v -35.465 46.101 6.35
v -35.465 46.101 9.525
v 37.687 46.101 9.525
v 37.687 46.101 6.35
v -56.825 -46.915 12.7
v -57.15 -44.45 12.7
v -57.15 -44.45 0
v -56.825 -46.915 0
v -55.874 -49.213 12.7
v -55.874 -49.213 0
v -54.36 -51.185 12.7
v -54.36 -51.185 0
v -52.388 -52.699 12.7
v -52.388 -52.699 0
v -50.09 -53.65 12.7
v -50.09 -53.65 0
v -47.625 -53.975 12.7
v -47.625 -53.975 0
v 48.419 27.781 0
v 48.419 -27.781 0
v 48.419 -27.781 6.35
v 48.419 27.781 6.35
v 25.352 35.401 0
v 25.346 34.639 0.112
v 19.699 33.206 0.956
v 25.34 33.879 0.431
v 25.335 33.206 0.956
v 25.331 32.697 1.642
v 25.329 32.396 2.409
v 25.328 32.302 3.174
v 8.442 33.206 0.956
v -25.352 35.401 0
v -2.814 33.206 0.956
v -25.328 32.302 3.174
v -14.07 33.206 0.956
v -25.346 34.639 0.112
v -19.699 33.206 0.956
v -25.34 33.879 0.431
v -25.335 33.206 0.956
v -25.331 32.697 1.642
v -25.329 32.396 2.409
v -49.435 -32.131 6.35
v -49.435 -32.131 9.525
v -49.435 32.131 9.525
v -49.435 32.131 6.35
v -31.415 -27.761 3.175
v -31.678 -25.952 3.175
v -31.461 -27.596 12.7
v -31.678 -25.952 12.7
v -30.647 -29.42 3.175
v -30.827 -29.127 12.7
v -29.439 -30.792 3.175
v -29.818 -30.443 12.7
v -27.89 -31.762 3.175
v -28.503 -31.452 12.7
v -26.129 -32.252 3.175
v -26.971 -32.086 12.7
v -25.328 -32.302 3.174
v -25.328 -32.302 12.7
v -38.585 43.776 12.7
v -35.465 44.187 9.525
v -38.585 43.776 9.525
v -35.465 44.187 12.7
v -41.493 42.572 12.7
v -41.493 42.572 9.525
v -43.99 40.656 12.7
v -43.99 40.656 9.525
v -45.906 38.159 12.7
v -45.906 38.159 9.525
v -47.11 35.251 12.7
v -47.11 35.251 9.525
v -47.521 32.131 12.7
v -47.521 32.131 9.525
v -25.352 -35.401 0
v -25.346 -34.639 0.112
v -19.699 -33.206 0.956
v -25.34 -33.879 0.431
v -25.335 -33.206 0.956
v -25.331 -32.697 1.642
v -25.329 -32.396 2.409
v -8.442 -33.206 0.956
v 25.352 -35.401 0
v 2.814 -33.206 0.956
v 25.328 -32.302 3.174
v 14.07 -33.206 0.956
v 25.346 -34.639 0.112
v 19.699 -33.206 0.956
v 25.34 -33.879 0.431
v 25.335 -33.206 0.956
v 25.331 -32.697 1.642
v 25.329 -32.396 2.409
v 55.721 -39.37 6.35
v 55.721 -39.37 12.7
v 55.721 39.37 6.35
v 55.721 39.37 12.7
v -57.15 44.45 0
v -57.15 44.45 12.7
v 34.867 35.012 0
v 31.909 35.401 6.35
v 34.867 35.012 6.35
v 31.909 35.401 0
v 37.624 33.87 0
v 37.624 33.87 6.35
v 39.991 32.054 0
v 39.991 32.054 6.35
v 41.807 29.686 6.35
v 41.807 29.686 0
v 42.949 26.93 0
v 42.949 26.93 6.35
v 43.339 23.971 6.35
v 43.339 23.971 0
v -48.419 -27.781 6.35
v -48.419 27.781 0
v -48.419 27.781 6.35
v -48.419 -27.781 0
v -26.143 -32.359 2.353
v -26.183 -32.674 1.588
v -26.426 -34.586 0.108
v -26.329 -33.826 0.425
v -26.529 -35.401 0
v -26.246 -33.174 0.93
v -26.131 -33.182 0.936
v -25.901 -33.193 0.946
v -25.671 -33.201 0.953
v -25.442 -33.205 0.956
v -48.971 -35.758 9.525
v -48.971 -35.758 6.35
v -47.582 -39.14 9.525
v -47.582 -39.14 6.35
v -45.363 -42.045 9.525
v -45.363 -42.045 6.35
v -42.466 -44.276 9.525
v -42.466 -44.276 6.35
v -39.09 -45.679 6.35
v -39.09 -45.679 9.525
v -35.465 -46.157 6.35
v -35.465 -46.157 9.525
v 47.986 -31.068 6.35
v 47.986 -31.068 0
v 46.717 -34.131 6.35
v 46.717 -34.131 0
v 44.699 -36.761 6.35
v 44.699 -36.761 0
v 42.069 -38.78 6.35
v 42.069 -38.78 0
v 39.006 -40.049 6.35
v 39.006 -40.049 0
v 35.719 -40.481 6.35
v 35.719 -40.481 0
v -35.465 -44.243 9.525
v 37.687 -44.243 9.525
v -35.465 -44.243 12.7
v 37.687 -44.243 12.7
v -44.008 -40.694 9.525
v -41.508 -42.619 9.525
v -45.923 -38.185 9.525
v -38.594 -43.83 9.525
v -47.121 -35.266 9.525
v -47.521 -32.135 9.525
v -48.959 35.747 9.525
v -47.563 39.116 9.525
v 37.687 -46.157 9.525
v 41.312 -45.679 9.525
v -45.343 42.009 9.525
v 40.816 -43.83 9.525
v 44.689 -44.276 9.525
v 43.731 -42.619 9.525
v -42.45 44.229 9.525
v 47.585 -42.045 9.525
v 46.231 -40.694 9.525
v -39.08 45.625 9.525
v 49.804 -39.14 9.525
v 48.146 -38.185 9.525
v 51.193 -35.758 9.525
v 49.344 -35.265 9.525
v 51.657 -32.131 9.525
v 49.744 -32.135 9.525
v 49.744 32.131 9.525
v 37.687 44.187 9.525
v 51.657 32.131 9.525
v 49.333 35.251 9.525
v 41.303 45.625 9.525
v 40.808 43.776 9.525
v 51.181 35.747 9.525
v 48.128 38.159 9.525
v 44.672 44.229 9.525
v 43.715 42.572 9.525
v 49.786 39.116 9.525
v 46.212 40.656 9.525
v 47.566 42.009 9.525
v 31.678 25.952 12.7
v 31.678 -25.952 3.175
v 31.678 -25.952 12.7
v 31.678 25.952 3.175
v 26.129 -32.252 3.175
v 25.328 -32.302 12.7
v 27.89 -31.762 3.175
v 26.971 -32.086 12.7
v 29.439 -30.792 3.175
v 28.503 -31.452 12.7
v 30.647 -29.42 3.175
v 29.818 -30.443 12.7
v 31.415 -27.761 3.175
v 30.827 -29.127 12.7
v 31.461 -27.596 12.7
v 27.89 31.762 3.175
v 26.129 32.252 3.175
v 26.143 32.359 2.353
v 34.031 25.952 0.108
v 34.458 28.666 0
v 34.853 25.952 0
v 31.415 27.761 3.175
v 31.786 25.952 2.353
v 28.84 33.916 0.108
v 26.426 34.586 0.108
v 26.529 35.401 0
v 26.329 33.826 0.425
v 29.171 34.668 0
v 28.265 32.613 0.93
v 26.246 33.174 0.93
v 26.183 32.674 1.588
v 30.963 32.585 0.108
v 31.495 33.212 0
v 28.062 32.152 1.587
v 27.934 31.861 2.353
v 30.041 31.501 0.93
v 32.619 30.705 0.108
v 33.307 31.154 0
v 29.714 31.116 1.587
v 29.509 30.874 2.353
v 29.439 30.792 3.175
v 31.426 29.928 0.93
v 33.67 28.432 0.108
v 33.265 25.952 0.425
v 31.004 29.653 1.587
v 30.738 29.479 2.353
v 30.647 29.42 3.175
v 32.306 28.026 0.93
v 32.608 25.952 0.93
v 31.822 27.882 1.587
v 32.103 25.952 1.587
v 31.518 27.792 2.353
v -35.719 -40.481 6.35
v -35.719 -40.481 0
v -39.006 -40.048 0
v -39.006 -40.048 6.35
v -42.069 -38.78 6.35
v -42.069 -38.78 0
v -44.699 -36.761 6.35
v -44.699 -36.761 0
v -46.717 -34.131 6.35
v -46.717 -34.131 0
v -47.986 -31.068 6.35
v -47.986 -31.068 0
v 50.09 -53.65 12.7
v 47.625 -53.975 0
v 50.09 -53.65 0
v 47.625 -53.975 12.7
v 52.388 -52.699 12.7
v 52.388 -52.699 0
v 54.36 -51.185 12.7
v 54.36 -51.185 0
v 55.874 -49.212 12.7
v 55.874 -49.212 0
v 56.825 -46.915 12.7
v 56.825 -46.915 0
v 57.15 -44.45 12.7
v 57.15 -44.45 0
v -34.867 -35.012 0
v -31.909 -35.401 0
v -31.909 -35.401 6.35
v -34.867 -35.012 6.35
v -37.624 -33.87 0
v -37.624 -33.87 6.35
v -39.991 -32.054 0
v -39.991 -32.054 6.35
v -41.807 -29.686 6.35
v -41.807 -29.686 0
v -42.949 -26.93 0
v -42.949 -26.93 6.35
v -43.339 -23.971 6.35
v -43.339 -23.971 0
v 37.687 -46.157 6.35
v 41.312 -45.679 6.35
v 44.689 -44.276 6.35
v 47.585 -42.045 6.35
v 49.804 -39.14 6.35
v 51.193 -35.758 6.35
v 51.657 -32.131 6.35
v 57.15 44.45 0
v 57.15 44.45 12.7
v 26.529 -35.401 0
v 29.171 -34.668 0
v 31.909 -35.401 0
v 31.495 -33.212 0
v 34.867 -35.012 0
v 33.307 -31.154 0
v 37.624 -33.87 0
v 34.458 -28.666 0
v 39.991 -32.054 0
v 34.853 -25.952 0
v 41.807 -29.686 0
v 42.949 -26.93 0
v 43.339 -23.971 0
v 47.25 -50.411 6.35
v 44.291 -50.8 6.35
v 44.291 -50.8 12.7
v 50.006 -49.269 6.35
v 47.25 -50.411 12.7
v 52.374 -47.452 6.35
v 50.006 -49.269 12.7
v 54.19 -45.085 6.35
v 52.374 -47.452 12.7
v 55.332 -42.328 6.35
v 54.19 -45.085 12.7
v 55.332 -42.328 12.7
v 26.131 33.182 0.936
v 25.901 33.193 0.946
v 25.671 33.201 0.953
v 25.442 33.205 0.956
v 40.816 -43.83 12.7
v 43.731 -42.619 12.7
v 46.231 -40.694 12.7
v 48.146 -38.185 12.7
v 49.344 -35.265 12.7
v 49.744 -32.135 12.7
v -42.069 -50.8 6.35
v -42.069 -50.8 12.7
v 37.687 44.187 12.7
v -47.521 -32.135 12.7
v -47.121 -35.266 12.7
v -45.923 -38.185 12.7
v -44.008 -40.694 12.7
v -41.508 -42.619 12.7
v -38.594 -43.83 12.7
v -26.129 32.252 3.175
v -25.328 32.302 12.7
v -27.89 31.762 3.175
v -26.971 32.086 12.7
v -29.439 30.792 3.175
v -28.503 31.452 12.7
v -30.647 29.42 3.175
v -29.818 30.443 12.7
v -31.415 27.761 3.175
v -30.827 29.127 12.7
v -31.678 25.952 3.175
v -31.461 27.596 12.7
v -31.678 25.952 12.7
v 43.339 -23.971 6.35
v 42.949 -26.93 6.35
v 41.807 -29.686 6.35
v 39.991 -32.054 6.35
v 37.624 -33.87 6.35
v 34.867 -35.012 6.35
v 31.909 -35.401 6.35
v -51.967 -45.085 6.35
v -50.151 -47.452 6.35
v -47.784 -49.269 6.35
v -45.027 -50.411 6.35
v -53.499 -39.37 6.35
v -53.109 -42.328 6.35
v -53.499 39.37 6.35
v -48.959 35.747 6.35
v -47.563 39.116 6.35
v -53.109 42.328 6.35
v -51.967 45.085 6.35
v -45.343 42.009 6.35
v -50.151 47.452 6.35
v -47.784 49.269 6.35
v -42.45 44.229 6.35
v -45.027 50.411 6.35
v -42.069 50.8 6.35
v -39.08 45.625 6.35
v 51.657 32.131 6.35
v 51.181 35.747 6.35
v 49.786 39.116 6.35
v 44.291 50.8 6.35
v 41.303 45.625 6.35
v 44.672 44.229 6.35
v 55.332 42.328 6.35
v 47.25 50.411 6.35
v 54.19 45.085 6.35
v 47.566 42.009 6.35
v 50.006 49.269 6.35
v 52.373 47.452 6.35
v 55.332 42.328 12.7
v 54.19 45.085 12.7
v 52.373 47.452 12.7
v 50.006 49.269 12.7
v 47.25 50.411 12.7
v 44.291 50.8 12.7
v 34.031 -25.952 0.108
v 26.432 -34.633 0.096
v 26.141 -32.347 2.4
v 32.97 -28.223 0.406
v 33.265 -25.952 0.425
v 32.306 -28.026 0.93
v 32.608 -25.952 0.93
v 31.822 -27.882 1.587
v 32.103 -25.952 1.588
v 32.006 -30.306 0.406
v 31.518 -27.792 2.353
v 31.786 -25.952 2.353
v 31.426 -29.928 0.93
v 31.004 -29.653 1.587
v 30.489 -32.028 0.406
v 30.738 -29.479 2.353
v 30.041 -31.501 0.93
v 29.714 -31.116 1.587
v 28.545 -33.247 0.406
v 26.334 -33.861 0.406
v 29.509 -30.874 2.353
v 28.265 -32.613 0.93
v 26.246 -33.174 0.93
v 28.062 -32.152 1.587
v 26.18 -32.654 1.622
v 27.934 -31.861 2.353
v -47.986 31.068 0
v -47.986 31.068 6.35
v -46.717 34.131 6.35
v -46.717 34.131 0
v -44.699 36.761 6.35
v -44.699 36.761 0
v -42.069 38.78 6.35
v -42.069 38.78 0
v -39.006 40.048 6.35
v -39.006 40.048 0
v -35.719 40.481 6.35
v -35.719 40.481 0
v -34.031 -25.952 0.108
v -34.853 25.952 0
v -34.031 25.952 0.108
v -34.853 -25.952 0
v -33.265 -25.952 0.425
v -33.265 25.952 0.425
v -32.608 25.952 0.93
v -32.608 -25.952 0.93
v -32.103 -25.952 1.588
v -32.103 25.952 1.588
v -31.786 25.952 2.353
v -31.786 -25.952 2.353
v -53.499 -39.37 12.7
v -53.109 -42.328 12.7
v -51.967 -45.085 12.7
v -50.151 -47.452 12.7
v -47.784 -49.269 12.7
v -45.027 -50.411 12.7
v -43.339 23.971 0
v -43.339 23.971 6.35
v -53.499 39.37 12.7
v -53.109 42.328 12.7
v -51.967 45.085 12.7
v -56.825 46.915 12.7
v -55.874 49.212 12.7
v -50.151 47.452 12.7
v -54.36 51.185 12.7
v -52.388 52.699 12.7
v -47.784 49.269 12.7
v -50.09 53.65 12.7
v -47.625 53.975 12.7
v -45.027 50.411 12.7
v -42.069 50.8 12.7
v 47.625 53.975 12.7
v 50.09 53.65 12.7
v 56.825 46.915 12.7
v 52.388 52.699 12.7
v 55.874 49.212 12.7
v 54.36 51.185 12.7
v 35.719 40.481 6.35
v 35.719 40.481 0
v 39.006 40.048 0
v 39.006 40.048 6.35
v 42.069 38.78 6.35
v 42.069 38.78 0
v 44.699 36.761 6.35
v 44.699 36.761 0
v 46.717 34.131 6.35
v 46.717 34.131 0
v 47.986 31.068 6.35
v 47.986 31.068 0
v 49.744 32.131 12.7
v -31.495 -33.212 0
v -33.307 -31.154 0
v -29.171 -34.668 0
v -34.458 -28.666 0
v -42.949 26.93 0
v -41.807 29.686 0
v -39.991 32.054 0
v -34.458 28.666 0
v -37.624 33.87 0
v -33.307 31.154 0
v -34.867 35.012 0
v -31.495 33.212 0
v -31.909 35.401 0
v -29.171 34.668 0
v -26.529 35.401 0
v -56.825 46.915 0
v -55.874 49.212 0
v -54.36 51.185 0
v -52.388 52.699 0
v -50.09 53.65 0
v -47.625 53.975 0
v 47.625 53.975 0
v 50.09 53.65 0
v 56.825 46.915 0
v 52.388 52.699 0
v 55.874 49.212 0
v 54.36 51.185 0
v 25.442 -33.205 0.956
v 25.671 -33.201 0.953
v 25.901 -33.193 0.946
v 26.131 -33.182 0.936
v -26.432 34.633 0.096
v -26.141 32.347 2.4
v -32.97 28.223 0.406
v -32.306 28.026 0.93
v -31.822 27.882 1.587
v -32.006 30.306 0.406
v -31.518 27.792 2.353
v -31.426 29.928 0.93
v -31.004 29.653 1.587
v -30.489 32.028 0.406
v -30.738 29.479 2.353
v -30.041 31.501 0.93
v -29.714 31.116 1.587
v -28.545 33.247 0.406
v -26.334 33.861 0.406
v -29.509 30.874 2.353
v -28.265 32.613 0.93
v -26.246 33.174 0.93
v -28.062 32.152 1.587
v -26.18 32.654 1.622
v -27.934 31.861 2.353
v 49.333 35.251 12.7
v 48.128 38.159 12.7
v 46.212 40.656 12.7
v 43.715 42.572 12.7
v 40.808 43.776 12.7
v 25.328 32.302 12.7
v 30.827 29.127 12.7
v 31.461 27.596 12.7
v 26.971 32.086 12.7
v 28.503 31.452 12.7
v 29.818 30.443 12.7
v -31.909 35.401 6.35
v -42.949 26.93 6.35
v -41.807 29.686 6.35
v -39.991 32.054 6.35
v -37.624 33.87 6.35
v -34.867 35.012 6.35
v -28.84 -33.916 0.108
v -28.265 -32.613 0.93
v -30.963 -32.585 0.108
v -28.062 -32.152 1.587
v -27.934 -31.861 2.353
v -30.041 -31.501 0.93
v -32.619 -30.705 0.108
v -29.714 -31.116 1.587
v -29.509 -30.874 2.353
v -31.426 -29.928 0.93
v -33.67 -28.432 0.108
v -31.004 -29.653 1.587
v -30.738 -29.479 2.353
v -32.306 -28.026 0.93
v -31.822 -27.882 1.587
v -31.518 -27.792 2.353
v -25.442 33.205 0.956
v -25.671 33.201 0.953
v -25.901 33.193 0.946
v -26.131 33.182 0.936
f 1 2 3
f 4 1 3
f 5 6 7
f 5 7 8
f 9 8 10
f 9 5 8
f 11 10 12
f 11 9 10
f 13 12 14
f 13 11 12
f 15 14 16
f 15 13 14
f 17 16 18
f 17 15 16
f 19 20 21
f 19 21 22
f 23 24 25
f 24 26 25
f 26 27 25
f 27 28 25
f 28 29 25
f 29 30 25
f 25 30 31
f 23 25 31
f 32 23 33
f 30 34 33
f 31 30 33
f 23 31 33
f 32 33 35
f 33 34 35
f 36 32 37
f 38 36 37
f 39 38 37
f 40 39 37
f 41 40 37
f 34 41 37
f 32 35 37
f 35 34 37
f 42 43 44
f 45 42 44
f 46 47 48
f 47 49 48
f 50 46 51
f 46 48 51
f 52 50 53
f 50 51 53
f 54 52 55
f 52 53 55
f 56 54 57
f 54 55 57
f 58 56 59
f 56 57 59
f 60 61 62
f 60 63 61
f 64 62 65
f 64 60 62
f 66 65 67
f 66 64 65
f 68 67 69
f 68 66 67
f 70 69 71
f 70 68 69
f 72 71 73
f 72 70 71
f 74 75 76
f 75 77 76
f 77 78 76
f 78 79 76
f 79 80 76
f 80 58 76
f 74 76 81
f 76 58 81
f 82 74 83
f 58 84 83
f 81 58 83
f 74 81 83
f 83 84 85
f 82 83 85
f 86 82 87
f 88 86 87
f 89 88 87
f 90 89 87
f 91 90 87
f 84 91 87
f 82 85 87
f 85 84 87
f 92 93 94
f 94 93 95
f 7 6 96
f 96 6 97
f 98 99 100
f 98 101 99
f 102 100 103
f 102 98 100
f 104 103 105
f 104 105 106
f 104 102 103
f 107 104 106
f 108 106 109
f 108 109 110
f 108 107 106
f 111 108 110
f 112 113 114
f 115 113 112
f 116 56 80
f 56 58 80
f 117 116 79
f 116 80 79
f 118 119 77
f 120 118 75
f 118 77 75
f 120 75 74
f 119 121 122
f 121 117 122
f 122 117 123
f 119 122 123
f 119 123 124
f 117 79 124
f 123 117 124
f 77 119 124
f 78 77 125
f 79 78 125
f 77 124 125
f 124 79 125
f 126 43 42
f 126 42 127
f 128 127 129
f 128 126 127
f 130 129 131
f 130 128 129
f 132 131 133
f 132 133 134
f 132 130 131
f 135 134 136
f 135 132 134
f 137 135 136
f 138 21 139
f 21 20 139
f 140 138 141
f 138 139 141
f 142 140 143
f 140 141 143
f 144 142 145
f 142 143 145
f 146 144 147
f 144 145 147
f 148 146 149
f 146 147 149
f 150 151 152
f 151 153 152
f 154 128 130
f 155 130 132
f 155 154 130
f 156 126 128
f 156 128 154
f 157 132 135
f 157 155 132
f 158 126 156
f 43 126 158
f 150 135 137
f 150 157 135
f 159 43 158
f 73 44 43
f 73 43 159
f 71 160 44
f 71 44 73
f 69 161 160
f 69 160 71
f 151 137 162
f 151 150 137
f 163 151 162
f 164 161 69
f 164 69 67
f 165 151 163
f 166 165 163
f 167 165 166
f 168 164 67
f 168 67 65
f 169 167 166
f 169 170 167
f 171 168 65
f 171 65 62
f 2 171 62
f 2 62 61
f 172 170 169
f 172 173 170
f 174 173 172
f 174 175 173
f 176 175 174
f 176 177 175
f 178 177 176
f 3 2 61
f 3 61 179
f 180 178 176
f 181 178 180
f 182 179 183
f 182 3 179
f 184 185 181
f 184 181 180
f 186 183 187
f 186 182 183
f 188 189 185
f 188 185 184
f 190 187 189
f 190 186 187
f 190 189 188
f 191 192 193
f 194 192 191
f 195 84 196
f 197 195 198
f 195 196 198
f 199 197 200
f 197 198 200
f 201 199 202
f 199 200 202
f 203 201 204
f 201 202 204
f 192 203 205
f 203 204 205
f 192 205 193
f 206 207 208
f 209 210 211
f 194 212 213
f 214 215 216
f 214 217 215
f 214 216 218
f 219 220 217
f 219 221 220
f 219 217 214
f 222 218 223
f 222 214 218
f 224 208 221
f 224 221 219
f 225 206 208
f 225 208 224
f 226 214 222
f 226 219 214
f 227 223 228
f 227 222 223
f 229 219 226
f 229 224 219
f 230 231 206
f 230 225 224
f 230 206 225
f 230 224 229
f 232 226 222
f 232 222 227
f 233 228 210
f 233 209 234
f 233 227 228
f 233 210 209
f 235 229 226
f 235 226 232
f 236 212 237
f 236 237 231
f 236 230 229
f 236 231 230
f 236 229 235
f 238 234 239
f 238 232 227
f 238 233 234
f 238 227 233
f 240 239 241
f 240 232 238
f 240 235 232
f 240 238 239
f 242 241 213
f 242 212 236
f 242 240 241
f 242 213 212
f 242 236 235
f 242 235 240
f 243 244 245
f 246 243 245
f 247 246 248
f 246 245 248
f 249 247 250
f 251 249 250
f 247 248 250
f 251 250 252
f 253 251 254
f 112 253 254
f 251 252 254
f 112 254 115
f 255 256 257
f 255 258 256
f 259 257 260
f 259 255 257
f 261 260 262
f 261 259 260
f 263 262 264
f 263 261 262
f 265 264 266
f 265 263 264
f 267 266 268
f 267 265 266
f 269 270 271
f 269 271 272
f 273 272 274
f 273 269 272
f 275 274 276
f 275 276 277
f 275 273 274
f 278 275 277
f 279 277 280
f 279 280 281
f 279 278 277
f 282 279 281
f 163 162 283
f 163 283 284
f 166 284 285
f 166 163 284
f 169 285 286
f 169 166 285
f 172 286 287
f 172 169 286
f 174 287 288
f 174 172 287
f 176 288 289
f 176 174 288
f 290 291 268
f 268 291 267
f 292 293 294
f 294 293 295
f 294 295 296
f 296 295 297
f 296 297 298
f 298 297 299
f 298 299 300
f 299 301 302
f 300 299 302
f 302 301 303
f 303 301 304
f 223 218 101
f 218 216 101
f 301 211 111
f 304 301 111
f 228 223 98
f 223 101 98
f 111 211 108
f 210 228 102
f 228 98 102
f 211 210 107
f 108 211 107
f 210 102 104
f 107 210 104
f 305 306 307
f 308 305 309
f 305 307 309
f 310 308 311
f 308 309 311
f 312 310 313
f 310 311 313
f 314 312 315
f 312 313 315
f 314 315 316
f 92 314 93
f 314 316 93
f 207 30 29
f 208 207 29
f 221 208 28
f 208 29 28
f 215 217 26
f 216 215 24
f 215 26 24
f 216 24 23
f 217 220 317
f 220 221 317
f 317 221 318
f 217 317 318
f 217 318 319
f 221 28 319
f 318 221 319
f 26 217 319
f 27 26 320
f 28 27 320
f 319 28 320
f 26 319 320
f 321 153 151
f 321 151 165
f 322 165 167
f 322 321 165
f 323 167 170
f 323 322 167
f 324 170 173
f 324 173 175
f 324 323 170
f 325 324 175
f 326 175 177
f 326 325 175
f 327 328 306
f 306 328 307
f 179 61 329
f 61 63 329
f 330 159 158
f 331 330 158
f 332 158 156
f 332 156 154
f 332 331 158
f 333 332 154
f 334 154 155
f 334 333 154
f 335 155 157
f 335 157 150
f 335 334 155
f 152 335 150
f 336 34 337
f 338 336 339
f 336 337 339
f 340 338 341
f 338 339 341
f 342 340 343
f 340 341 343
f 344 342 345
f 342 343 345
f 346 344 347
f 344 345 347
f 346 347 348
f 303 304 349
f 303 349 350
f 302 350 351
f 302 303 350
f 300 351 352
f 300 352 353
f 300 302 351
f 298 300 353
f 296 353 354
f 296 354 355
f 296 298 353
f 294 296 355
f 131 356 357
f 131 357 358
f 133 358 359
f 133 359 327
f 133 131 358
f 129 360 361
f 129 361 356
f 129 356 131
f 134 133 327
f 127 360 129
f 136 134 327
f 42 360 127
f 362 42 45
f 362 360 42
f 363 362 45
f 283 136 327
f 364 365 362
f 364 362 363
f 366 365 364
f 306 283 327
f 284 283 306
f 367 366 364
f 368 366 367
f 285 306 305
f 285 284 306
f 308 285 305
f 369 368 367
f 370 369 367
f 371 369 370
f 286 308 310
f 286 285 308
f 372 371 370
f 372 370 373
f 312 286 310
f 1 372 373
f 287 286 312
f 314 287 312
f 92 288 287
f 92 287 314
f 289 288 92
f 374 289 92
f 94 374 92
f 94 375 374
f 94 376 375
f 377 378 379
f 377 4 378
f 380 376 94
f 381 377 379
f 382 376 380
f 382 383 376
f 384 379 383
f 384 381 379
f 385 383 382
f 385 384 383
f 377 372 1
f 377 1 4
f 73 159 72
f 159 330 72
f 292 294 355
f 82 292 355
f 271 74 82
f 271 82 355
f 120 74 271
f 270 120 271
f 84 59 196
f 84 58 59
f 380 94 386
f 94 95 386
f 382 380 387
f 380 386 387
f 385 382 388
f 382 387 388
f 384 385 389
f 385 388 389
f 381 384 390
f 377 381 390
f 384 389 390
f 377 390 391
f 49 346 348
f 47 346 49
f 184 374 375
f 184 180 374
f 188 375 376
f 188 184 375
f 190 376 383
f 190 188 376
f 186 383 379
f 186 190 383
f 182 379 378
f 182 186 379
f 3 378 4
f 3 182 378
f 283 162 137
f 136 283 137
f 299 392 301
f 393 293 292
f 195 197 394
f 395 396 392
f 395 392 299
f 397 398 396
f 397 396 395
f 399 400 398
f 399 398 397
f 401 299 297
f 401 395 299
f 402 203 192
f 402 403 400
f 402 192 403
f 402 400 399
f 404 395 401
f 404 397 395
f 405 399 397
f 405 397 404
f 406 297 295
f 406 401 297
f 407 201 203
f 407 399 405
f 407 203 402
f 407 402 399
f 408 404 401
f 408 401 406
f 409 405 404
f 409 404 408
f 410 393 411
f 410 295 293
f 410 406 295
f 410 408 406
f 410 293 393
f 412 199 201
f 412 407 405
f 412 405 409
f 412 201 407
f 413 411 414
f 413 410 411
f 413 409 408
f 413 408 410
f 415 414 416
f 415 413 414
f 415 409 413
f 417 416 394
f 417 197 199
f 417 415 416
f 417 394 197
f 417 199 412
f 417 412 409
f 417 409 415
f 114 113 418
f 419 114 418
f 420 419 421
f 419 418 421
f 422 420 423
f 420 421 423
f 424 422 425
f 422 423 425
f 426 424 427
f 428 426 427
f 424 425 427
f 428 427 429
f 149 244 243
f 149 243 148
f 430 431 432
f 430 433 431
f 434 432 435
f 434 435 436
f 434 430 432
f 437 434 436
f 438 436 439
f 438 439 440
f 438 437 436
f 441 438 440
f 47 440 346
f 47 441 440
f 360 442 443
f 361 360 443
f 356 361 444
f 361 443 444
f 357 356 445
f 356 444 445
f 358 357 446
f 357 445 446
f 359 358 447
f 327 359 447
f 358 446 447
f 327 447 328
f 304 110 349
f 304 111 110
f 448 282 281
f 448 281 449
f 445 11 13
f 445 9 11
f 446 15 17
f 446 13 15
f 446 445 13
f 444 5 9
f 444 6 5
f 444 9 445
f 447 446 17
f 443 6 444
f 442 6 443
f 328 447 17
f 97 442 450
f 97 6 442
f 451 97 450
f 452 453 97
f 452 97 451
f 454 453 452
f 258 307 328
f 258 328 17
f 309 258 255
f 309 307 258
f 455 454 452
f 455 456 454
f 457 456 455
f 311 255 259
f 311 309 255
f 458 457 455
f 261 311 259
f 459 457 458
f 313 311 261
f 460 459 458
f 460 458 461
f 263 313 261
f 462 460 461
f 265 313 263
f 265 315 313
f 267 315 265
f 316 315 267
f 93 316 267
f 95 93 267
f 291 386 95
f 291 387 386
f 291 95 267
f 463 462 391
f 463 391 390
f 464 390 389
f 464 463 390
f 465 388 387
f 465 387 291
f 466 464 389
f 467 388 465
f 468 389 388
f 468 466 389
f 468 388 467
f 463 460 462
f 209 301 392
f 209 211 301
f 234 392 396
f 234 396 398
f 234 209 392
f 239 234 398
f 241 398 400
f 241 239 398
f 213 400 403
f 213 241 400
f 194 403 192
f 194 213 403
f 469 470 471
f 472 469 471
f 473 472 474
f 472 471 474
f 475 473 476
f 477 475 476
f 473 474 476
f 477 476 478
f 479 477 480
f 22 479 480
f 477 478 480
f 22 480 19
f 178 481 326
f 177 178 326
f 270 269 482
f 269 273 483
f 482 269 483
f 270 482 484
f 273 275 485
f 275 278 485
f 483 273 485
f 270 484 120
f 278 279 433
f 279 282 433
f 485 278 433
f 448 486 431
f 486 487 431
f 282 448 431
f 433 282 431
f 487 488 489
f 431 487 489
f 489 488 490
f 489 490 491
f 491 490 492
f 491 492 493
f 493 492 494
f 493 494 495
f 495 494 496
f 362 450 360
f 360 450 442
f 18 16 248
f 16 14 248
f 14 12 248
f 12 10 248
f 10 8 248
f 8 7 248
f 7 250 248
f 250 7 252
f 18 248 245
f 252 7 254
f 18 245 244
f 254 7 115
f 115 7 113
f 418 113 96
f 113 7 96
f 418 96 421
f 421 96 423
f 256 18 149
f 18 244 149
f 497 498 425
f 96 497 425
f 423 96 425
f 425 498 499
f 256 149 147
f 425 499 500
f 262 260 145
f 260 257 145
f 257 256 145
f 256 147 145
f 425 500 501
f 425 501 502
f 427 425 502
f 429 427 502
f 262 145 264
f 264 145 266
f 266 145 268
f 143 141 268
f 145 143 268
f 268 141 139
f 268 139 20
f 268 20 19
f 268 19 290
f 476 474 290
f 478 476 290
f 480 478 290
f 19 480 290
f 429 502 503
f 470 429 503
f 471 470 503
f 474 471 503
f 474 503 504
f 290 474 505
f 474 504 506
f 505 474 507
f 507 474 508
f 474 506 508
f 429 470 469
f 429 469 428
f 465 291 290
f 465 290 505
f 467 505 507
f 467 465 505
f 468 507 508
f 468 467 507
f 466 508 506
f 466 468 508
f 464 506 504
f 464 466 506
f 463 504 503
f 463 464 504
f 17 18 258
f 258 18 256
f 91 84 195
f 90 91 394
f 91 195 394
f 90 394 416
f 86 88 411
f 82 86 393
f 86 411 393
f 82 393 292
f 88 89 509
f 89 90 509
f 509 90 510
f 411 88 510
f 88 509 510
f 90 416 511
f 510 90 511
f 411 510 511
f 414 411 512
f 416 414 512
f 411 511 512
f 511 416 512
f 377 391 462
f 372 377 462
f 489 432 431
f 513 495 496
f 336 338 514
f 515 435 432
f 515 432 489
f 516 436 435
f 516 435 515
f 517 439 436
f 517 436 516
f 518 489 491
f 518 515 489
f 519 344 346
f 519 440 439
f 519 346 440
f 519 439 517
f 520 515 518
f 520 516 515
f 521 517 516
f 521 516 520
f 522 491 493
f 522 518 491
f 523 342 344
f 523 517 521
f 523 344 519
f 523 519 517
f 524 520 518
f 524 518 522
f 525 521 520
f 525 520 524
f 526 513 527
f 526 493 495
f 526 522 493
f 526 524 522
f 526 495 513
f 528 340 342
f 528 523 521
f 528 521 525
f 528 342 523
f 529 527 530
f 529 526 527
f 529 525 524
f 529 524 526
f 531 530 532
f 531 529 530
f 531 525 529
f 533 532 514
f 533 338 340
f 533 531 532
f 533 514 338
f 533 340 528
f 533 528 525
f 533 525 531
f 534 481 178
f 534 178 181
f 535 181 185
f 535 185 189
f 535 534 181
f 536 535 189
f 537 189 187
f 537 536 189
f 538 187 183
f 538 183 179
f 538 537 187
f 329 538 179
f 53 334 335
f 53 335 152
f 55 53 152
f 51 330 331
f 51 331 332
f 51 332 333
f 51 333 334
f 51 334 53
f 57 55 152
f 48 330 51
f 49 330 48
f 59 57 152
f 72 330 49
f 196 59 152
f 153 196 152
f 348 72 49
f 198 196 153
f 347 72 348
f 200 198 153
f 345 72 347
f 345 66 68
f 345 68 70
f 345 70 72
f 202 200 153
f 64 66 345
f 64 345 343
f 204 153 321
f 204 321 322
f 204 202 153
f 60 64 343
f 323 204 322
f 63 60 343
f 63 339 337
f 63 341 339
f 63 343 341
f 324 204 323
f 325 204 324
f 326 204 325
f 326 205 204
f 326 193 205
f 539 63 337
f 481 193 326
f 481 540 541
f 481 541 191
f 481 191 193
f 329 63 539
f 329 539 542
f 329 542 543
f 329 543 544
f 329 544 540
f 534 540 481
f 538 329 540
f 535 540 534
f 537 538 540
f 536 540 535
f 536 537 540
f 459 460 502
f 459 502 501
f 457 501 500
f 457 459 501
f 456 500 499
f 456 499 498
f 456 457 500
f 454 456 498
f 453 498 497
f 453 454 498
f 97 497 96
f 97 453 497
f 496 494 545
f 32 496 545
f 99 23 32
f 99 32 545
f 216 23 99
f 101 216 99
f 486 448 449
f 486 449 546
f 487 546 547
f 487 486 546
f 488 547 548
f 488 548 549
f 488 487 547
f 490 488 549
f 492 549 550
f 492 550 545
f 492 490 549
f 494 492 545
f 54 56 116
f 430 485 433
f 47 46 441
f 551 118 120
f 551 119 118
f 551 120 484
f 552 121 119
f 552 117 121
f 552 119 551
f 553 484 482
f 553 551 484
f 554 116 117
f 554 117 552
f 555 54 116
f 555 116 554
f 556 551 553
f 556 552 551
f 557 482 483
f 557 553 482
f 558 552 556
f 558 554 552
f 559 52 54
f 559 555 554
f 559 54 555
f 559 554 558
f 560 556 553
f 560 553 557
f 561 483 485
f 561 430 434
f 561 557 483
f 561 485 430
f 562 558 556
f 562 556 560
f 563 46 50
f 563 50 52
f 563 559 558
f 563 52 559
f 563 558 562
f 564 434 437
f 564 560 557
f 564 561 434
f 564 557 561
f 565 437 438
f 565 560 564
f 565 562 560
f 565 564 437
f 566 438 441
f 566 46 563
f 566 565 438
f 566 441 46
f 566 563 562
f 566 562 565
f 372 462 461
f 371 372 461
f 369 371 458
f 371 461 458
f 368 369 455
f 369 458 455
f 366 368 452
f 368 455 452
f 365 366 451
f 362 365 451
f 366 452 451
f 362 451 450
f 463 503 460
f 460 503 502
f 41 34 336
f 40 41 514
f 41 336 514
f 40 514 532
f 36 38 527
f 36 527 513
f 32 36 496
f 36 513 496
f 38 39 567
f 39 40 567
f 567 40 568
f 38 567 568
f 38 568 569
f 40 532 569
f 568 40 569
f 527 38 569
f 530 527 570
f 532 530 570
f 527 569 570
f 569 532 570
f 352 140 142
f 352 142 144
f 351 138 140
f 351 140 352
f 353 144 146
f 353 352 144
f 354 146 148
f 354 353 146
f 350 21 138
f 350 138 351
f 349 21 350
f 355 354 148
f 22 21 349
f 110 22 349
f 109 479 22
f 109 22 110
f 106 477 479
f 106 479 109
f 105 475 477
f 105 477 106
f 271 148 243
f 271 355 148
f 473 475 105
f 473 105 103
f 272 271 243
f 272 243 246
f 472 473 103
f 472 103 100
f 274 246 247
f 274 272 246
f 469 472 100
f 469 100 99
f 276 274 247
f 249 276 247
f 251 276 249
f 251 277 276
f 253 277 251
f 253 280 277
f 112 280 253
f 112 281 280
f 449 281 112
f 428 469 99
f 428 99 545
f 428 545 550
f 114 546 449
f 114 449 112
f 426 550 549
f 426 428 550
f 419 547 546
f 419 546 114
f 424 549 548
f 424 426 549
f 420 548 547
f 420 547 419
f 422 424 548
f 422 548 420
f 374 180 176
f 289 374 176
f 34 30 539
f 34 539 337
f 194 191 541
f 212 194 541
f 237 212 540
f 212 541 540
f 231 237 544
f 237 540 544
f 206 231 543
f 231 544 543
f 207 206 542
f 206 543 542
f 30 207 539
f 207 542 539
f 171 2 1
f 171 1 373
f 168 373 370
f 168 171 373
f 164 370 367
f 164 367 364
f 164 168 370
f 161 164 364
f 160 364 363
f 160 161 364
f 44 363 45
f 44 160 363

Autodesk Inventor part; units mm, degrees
ref_plane "YZ Plane" through (0, 0, 0) normal (1, 0, 0) x (0, 1, 0)
ref_plane "XZ Plane" through (0, 0, 0) normal (0, 1, 0) x (-1, 0, 0)
ref_plane "XY Plane" through (0, 0, 0) normal (0, 0, 1) x (1, 0, 0)
sketch "Sketch1" plane through (0, 0, 0) normal (0, 0, 1) x (1, 0, 0)
  line L0 (-60.325, -53.975) -> (60.325, -53.975)
  line L1 (60.325, -53.975) -> (60.325, 53.975)
  line L2 (60.325, 53.975) -> (-60.325, 53.975)
  line L3 (-60.325, 53.975) -> (-60.325, -53.975)
  line L4 (-60.325, -53.975) -> (60.325, 53.975) construction
  line L5 (60.325, -53.975) -> (-60.325, 53.975) construction
  point P0 (0, 0)
  dimension "d0" = 120.65
  dimension "d1" = 107.95
extrude "Polycarbonate Plate" add sketch "Sketch1" along normal blind 12.7
sketch "Sketch2" plane through (0, 0, 12.7) normal (0, 0, 1) x (1, 0, 0)
  line L0 (-42.0687, -50.8) -> (44.2913, -50.8)
  line L1 (55.7212, -39.37) -> (55.7212, 39.37)
  line L2 (44.2912, 50.8) -> (-42.0687, 50.8)
  line L3 (-53.4987, 39.37) -> (-53.4987, -39.37)
  line L4 (-53.4987, -50.8) -> (55.7212, 50.8) construction
  line L5 (55.7212, -50.8) -> (-53.4987, 50.8) construction
  line L6 (-35.4647, 46.101) -> (37.6872, 46.101)
  line L7 (51.6573, 32.131) -> (51.6573, -32.131)
  line L8 (37.6874, -46.157) -> (-35.4649, -46.157)
  line L9 (-49.4347, -32.131) -> (-49.4347, 32.131)
  arc A0 (-51.9112, 50.8) -> (-53.4987, 49.2125) centre (-51.9112, 49.2125) ccw
  arc A1 (-35.4647, 46.101) -> (-49.4347, 32.131) centre (-35.4647, 32.131) ccw
  arc A2 (51.6573, 32.131) -> (37.6872, 46.101) centre (37.6872, 32.131) ccw
  arc A3 (37.6874, -46.157) -> (51.6573, -32.131) centre (37.6874, -32.187) ccw
  arc A4 (-49.4347, -32.131) -> (-35.4649, -46.157) centre (-35.4649, -32.187) ccw
  arc A5 (-42.0687, 50.8) -> (-53.4987, 39.37) centre (-42.0687, 39.37) ccw
  arc A6 (55.7212, 39.37) -> (44.2912, 50.8) centre (44.2912, 39.37) ccw
  arc A7 (44.2913, -50.8) -> (55.7212, -39.37) centre (44.2913, -39.37) ccw
  arc A8 (-53.4987, -39.37) -> (-42.0687, -50.8) centre (-42.0687, -39.37) ccw
  point P0 (1.1113, 0)
  dimension "d4" = 109.22
  dimension "d5" = 101.6
  dimension "d6" = 4.699
  dimension "d10" = 13.97
  dimension "d11" = 11.43
  dimension "d26" = 4.064
  dimension "d28" = 4.064
extrude "Lid Recess" cut sketch "Sketch2" against normal blind 6.35
sketch "Sketch3" plane through (0, 0, 0) normal (0, 0, -1) x (-1, 0, 0)
  line L0 (35.7188, -40.4812) -> (-35.7188, -40.4813)
  line L1 (-48.4187, -27.7813) -> (-48.4188, 27.7812)
  line L2 (-35.7188, 40.4812) -> (35.7187, 40.4812)
  line L3 (48.4188, 27.7812) -> (48.4188, -27.7812)
  line L4 (48.4188, -40.4812) -> (-48.4188, 40.4812) construction
  line L5 (-48.4188, -40.4813) -> (48.4188, 40.4813) construction
  line L6 (-43.3388, 23.9713) -> (-43.3388, -23.9713)
  line L7 (-31.9088, -35.4013) -> (31.9088, -35.4013)
  line L8 (43.3388, -23.9713) -> (43.3388, 23.9713)
  line L9 (31.9088, 35.4013) -> (-31.9088, 35.4013)
  arc A0 (-43.3388, -23.9713) -> (-31.9088, -35.4013) centre (-31.9088, -23.9713) ccw
  arc A1 (31.9088, -35.4013) -> (43.3388, -23.9713) centre (31.9088, -23.9713) ccw
  arc A2 (43.3388, 23.9713) -> (31.9088, 35.4013) centre (31.9088, 23.9713) ccw
  arc A3 (-31.9088, 35.4013) -> (-43.3388, 23.9713) centre (-31.9088, 23.9713) ccw
  arc A4 (-35.7188, 40.4812) -> (-48.4188, 27.7812) centre (-35.7188, 27.7812) ccw
  arc A5 (-48.4187, -27.7813) -> (-35.7188, -40.4813) centre (-35.7188, -27.7813) ccw
  arc A6 (35.7188, -40.4812) -> (48.4188, -27.7812) centre (35.7188, -27.7812) ccw
  arc A7 (48.4188, 27.7812) -> (35.7187, 40.4812) centre (35.7188, 27.7812) ccw
  point P0 (0, 0)
  dimension "d14" = 96.8375
  dimension "d15" = 80.9625
  dimension "d16" = 5.08
  dimension "d17" = 11.43
  dimension "d18" = 12.7
fillet "Fillet1" radius 3.175 4 edges at (-60.325, 53.975, 6.35) (-60.325, -53.975, 6.35) (60.325, 53.975, 6.35) (60.325, -53.975, 6.35)
extrude "Small Recess" cut sketch "Sketch3" against normal blind 6.35
sketch "Sketch4" plane through (0, 0, 0) normal (0, 0, -1) x (-1, 0, 0)
  line L0 (-31.6778, 32.3024) -> (31.6778, 32.3024)
  line L1 (31.6778, 32.3024) -> (31.6778, -32.3024)
  line L2 (31.6778, -32.3024) -> (-31.6778, -32.3024)
  line L3 (-31.6778, -32.3024) -> (-31.6778, 32.3024)
  line L4 (-31.6778, 32.3024) -> (31.6778, -32.3024) construction
  line L5 (31.6778, 32.3024) -> (-31.6778, -32.3024) construction
  point P0 (0, 0)
extrude "Inside Dimension" cut sketch "Sketch4" against normal through all
fillet "Fillet2" radius 6.35 4 edges at (-31.6778, 32.3024, 6.35) (31.6778, -32.3024, 6.35) (31.6778, 32.3024, 6.35) (-31.6778, -32.3024, 6.35)
fillet "Fillet3" radius 3.175 8 edges at (-29.8179, -30.4425, 0) (0, -32.3024, 0) (29.8179, -30.4425, 0) (31.6778, 0, 0) (29.8179, 30.4425, 0) (0, 32.3024, 0) (-29.8179, 30.4425, 0) (-31.6778, 0, 0)
sketch "Sketch5" plane through (0, 0, 12.7) normal (0, 0, 1) x (1, 0, 0)
  arc A0 (57.15, -53.975) -> (60.325, -50.8) centre (57.15, -50.8) ccw
  line L0 (60.325, -50.8) -> (60.325, 50.8)
  arc A1 (60.325, 50.8) -> (57.15, 53.975) centre (57.15, 50.8) ccw
  arc A2 (-57.15, 53.975) -> (-60.325, 50.8) centre (-57.15, 50.8) ccw
  line L1 (-60.325, 50.8) -> (-60.325, -50.8)
  arc A3 (-60.325, -50.8) -> (-57.15, -53.975) centre (-57.15, -50.8) ccw
  line L2 (57.15, 53.975) -> (57.15, -53.975)
  line L3 (-57.15, -53.975) -> (-57.15, 53.975)
extrude "Extrusion5" cut sketch "Sketch5" against normal through all
fillet "Fillet4" radius 9.525 4 edges at (-57.15, 53.975, 6.35) (57.15, 53.975, 6.35) (57.15, -53.975, 6.35) (-57.15, -53.975, 6.35)
sketch "Sketch6" plane through (0, 0, 12.7) normal (0, 0, 1) x (1, 0, 0)
  arc A0 (-49.4347, -32.131) -> (-35.4649, -46.157) centre (-35.4649, -32.187) ccw
  line L0 (-35.4649, -46.157) -> (37.6874, -46.157)
  arc A1 (37.6874, -46.157) -> (51.6573, -32.131) centre (37.6874, -32.187) ccw
  line L1 (51.6573, -32.131) -> (51.6573, 32.131)
  arc A2 (51.6573, 32.131) -> (37.6872, 46.101) centre (37.6872, 32.131) ccw
  line L2 (37.6872, 46.101) -> (-35.4647, 46.101)
  arc A3 (-35.4647, 46.101) -> (-49.4347, 32.131) centre (-35.4647, 32.131) ccw
  line L3 (-49.4347, 32.131) -> (-49.4347, -32.131)
  arc A4 (-35.4647, 44.1873) -> (-47.521, 32.131) centre (-35.4647, 32.131) ccw
  line L4 (-35.4647, 44.1873) -> (37.6873, 44.1873)
  arc A5 (49.7435, 32.131) -> (37.6873, 44.1873) centre (37.6872, 32.131) ccw
  line L5 (49.7435, 32.131) -> (49.7435, -32.135)
  arc A6 (37.6874, -44.2432) -> (49.7435, -32.135) centre (37.6874, -32.187) ccw
  line L6 (37.6874, -44.2432) -> (-35.4649, -44.2432)
  arc A7 (-47.521, -32.135) -> (-35.4649, -44.2432) centre (-35.4649, -32.187) ccw
  line L7 (-47.521, -32.135) -> (-47.521, 32.131)
extrude "Extrusion6" cut sketch "Sketch6" against normal blind 3.175
equation "\"d28\" = d26"
properties material "POLYCARBONATE, CLEAR"
